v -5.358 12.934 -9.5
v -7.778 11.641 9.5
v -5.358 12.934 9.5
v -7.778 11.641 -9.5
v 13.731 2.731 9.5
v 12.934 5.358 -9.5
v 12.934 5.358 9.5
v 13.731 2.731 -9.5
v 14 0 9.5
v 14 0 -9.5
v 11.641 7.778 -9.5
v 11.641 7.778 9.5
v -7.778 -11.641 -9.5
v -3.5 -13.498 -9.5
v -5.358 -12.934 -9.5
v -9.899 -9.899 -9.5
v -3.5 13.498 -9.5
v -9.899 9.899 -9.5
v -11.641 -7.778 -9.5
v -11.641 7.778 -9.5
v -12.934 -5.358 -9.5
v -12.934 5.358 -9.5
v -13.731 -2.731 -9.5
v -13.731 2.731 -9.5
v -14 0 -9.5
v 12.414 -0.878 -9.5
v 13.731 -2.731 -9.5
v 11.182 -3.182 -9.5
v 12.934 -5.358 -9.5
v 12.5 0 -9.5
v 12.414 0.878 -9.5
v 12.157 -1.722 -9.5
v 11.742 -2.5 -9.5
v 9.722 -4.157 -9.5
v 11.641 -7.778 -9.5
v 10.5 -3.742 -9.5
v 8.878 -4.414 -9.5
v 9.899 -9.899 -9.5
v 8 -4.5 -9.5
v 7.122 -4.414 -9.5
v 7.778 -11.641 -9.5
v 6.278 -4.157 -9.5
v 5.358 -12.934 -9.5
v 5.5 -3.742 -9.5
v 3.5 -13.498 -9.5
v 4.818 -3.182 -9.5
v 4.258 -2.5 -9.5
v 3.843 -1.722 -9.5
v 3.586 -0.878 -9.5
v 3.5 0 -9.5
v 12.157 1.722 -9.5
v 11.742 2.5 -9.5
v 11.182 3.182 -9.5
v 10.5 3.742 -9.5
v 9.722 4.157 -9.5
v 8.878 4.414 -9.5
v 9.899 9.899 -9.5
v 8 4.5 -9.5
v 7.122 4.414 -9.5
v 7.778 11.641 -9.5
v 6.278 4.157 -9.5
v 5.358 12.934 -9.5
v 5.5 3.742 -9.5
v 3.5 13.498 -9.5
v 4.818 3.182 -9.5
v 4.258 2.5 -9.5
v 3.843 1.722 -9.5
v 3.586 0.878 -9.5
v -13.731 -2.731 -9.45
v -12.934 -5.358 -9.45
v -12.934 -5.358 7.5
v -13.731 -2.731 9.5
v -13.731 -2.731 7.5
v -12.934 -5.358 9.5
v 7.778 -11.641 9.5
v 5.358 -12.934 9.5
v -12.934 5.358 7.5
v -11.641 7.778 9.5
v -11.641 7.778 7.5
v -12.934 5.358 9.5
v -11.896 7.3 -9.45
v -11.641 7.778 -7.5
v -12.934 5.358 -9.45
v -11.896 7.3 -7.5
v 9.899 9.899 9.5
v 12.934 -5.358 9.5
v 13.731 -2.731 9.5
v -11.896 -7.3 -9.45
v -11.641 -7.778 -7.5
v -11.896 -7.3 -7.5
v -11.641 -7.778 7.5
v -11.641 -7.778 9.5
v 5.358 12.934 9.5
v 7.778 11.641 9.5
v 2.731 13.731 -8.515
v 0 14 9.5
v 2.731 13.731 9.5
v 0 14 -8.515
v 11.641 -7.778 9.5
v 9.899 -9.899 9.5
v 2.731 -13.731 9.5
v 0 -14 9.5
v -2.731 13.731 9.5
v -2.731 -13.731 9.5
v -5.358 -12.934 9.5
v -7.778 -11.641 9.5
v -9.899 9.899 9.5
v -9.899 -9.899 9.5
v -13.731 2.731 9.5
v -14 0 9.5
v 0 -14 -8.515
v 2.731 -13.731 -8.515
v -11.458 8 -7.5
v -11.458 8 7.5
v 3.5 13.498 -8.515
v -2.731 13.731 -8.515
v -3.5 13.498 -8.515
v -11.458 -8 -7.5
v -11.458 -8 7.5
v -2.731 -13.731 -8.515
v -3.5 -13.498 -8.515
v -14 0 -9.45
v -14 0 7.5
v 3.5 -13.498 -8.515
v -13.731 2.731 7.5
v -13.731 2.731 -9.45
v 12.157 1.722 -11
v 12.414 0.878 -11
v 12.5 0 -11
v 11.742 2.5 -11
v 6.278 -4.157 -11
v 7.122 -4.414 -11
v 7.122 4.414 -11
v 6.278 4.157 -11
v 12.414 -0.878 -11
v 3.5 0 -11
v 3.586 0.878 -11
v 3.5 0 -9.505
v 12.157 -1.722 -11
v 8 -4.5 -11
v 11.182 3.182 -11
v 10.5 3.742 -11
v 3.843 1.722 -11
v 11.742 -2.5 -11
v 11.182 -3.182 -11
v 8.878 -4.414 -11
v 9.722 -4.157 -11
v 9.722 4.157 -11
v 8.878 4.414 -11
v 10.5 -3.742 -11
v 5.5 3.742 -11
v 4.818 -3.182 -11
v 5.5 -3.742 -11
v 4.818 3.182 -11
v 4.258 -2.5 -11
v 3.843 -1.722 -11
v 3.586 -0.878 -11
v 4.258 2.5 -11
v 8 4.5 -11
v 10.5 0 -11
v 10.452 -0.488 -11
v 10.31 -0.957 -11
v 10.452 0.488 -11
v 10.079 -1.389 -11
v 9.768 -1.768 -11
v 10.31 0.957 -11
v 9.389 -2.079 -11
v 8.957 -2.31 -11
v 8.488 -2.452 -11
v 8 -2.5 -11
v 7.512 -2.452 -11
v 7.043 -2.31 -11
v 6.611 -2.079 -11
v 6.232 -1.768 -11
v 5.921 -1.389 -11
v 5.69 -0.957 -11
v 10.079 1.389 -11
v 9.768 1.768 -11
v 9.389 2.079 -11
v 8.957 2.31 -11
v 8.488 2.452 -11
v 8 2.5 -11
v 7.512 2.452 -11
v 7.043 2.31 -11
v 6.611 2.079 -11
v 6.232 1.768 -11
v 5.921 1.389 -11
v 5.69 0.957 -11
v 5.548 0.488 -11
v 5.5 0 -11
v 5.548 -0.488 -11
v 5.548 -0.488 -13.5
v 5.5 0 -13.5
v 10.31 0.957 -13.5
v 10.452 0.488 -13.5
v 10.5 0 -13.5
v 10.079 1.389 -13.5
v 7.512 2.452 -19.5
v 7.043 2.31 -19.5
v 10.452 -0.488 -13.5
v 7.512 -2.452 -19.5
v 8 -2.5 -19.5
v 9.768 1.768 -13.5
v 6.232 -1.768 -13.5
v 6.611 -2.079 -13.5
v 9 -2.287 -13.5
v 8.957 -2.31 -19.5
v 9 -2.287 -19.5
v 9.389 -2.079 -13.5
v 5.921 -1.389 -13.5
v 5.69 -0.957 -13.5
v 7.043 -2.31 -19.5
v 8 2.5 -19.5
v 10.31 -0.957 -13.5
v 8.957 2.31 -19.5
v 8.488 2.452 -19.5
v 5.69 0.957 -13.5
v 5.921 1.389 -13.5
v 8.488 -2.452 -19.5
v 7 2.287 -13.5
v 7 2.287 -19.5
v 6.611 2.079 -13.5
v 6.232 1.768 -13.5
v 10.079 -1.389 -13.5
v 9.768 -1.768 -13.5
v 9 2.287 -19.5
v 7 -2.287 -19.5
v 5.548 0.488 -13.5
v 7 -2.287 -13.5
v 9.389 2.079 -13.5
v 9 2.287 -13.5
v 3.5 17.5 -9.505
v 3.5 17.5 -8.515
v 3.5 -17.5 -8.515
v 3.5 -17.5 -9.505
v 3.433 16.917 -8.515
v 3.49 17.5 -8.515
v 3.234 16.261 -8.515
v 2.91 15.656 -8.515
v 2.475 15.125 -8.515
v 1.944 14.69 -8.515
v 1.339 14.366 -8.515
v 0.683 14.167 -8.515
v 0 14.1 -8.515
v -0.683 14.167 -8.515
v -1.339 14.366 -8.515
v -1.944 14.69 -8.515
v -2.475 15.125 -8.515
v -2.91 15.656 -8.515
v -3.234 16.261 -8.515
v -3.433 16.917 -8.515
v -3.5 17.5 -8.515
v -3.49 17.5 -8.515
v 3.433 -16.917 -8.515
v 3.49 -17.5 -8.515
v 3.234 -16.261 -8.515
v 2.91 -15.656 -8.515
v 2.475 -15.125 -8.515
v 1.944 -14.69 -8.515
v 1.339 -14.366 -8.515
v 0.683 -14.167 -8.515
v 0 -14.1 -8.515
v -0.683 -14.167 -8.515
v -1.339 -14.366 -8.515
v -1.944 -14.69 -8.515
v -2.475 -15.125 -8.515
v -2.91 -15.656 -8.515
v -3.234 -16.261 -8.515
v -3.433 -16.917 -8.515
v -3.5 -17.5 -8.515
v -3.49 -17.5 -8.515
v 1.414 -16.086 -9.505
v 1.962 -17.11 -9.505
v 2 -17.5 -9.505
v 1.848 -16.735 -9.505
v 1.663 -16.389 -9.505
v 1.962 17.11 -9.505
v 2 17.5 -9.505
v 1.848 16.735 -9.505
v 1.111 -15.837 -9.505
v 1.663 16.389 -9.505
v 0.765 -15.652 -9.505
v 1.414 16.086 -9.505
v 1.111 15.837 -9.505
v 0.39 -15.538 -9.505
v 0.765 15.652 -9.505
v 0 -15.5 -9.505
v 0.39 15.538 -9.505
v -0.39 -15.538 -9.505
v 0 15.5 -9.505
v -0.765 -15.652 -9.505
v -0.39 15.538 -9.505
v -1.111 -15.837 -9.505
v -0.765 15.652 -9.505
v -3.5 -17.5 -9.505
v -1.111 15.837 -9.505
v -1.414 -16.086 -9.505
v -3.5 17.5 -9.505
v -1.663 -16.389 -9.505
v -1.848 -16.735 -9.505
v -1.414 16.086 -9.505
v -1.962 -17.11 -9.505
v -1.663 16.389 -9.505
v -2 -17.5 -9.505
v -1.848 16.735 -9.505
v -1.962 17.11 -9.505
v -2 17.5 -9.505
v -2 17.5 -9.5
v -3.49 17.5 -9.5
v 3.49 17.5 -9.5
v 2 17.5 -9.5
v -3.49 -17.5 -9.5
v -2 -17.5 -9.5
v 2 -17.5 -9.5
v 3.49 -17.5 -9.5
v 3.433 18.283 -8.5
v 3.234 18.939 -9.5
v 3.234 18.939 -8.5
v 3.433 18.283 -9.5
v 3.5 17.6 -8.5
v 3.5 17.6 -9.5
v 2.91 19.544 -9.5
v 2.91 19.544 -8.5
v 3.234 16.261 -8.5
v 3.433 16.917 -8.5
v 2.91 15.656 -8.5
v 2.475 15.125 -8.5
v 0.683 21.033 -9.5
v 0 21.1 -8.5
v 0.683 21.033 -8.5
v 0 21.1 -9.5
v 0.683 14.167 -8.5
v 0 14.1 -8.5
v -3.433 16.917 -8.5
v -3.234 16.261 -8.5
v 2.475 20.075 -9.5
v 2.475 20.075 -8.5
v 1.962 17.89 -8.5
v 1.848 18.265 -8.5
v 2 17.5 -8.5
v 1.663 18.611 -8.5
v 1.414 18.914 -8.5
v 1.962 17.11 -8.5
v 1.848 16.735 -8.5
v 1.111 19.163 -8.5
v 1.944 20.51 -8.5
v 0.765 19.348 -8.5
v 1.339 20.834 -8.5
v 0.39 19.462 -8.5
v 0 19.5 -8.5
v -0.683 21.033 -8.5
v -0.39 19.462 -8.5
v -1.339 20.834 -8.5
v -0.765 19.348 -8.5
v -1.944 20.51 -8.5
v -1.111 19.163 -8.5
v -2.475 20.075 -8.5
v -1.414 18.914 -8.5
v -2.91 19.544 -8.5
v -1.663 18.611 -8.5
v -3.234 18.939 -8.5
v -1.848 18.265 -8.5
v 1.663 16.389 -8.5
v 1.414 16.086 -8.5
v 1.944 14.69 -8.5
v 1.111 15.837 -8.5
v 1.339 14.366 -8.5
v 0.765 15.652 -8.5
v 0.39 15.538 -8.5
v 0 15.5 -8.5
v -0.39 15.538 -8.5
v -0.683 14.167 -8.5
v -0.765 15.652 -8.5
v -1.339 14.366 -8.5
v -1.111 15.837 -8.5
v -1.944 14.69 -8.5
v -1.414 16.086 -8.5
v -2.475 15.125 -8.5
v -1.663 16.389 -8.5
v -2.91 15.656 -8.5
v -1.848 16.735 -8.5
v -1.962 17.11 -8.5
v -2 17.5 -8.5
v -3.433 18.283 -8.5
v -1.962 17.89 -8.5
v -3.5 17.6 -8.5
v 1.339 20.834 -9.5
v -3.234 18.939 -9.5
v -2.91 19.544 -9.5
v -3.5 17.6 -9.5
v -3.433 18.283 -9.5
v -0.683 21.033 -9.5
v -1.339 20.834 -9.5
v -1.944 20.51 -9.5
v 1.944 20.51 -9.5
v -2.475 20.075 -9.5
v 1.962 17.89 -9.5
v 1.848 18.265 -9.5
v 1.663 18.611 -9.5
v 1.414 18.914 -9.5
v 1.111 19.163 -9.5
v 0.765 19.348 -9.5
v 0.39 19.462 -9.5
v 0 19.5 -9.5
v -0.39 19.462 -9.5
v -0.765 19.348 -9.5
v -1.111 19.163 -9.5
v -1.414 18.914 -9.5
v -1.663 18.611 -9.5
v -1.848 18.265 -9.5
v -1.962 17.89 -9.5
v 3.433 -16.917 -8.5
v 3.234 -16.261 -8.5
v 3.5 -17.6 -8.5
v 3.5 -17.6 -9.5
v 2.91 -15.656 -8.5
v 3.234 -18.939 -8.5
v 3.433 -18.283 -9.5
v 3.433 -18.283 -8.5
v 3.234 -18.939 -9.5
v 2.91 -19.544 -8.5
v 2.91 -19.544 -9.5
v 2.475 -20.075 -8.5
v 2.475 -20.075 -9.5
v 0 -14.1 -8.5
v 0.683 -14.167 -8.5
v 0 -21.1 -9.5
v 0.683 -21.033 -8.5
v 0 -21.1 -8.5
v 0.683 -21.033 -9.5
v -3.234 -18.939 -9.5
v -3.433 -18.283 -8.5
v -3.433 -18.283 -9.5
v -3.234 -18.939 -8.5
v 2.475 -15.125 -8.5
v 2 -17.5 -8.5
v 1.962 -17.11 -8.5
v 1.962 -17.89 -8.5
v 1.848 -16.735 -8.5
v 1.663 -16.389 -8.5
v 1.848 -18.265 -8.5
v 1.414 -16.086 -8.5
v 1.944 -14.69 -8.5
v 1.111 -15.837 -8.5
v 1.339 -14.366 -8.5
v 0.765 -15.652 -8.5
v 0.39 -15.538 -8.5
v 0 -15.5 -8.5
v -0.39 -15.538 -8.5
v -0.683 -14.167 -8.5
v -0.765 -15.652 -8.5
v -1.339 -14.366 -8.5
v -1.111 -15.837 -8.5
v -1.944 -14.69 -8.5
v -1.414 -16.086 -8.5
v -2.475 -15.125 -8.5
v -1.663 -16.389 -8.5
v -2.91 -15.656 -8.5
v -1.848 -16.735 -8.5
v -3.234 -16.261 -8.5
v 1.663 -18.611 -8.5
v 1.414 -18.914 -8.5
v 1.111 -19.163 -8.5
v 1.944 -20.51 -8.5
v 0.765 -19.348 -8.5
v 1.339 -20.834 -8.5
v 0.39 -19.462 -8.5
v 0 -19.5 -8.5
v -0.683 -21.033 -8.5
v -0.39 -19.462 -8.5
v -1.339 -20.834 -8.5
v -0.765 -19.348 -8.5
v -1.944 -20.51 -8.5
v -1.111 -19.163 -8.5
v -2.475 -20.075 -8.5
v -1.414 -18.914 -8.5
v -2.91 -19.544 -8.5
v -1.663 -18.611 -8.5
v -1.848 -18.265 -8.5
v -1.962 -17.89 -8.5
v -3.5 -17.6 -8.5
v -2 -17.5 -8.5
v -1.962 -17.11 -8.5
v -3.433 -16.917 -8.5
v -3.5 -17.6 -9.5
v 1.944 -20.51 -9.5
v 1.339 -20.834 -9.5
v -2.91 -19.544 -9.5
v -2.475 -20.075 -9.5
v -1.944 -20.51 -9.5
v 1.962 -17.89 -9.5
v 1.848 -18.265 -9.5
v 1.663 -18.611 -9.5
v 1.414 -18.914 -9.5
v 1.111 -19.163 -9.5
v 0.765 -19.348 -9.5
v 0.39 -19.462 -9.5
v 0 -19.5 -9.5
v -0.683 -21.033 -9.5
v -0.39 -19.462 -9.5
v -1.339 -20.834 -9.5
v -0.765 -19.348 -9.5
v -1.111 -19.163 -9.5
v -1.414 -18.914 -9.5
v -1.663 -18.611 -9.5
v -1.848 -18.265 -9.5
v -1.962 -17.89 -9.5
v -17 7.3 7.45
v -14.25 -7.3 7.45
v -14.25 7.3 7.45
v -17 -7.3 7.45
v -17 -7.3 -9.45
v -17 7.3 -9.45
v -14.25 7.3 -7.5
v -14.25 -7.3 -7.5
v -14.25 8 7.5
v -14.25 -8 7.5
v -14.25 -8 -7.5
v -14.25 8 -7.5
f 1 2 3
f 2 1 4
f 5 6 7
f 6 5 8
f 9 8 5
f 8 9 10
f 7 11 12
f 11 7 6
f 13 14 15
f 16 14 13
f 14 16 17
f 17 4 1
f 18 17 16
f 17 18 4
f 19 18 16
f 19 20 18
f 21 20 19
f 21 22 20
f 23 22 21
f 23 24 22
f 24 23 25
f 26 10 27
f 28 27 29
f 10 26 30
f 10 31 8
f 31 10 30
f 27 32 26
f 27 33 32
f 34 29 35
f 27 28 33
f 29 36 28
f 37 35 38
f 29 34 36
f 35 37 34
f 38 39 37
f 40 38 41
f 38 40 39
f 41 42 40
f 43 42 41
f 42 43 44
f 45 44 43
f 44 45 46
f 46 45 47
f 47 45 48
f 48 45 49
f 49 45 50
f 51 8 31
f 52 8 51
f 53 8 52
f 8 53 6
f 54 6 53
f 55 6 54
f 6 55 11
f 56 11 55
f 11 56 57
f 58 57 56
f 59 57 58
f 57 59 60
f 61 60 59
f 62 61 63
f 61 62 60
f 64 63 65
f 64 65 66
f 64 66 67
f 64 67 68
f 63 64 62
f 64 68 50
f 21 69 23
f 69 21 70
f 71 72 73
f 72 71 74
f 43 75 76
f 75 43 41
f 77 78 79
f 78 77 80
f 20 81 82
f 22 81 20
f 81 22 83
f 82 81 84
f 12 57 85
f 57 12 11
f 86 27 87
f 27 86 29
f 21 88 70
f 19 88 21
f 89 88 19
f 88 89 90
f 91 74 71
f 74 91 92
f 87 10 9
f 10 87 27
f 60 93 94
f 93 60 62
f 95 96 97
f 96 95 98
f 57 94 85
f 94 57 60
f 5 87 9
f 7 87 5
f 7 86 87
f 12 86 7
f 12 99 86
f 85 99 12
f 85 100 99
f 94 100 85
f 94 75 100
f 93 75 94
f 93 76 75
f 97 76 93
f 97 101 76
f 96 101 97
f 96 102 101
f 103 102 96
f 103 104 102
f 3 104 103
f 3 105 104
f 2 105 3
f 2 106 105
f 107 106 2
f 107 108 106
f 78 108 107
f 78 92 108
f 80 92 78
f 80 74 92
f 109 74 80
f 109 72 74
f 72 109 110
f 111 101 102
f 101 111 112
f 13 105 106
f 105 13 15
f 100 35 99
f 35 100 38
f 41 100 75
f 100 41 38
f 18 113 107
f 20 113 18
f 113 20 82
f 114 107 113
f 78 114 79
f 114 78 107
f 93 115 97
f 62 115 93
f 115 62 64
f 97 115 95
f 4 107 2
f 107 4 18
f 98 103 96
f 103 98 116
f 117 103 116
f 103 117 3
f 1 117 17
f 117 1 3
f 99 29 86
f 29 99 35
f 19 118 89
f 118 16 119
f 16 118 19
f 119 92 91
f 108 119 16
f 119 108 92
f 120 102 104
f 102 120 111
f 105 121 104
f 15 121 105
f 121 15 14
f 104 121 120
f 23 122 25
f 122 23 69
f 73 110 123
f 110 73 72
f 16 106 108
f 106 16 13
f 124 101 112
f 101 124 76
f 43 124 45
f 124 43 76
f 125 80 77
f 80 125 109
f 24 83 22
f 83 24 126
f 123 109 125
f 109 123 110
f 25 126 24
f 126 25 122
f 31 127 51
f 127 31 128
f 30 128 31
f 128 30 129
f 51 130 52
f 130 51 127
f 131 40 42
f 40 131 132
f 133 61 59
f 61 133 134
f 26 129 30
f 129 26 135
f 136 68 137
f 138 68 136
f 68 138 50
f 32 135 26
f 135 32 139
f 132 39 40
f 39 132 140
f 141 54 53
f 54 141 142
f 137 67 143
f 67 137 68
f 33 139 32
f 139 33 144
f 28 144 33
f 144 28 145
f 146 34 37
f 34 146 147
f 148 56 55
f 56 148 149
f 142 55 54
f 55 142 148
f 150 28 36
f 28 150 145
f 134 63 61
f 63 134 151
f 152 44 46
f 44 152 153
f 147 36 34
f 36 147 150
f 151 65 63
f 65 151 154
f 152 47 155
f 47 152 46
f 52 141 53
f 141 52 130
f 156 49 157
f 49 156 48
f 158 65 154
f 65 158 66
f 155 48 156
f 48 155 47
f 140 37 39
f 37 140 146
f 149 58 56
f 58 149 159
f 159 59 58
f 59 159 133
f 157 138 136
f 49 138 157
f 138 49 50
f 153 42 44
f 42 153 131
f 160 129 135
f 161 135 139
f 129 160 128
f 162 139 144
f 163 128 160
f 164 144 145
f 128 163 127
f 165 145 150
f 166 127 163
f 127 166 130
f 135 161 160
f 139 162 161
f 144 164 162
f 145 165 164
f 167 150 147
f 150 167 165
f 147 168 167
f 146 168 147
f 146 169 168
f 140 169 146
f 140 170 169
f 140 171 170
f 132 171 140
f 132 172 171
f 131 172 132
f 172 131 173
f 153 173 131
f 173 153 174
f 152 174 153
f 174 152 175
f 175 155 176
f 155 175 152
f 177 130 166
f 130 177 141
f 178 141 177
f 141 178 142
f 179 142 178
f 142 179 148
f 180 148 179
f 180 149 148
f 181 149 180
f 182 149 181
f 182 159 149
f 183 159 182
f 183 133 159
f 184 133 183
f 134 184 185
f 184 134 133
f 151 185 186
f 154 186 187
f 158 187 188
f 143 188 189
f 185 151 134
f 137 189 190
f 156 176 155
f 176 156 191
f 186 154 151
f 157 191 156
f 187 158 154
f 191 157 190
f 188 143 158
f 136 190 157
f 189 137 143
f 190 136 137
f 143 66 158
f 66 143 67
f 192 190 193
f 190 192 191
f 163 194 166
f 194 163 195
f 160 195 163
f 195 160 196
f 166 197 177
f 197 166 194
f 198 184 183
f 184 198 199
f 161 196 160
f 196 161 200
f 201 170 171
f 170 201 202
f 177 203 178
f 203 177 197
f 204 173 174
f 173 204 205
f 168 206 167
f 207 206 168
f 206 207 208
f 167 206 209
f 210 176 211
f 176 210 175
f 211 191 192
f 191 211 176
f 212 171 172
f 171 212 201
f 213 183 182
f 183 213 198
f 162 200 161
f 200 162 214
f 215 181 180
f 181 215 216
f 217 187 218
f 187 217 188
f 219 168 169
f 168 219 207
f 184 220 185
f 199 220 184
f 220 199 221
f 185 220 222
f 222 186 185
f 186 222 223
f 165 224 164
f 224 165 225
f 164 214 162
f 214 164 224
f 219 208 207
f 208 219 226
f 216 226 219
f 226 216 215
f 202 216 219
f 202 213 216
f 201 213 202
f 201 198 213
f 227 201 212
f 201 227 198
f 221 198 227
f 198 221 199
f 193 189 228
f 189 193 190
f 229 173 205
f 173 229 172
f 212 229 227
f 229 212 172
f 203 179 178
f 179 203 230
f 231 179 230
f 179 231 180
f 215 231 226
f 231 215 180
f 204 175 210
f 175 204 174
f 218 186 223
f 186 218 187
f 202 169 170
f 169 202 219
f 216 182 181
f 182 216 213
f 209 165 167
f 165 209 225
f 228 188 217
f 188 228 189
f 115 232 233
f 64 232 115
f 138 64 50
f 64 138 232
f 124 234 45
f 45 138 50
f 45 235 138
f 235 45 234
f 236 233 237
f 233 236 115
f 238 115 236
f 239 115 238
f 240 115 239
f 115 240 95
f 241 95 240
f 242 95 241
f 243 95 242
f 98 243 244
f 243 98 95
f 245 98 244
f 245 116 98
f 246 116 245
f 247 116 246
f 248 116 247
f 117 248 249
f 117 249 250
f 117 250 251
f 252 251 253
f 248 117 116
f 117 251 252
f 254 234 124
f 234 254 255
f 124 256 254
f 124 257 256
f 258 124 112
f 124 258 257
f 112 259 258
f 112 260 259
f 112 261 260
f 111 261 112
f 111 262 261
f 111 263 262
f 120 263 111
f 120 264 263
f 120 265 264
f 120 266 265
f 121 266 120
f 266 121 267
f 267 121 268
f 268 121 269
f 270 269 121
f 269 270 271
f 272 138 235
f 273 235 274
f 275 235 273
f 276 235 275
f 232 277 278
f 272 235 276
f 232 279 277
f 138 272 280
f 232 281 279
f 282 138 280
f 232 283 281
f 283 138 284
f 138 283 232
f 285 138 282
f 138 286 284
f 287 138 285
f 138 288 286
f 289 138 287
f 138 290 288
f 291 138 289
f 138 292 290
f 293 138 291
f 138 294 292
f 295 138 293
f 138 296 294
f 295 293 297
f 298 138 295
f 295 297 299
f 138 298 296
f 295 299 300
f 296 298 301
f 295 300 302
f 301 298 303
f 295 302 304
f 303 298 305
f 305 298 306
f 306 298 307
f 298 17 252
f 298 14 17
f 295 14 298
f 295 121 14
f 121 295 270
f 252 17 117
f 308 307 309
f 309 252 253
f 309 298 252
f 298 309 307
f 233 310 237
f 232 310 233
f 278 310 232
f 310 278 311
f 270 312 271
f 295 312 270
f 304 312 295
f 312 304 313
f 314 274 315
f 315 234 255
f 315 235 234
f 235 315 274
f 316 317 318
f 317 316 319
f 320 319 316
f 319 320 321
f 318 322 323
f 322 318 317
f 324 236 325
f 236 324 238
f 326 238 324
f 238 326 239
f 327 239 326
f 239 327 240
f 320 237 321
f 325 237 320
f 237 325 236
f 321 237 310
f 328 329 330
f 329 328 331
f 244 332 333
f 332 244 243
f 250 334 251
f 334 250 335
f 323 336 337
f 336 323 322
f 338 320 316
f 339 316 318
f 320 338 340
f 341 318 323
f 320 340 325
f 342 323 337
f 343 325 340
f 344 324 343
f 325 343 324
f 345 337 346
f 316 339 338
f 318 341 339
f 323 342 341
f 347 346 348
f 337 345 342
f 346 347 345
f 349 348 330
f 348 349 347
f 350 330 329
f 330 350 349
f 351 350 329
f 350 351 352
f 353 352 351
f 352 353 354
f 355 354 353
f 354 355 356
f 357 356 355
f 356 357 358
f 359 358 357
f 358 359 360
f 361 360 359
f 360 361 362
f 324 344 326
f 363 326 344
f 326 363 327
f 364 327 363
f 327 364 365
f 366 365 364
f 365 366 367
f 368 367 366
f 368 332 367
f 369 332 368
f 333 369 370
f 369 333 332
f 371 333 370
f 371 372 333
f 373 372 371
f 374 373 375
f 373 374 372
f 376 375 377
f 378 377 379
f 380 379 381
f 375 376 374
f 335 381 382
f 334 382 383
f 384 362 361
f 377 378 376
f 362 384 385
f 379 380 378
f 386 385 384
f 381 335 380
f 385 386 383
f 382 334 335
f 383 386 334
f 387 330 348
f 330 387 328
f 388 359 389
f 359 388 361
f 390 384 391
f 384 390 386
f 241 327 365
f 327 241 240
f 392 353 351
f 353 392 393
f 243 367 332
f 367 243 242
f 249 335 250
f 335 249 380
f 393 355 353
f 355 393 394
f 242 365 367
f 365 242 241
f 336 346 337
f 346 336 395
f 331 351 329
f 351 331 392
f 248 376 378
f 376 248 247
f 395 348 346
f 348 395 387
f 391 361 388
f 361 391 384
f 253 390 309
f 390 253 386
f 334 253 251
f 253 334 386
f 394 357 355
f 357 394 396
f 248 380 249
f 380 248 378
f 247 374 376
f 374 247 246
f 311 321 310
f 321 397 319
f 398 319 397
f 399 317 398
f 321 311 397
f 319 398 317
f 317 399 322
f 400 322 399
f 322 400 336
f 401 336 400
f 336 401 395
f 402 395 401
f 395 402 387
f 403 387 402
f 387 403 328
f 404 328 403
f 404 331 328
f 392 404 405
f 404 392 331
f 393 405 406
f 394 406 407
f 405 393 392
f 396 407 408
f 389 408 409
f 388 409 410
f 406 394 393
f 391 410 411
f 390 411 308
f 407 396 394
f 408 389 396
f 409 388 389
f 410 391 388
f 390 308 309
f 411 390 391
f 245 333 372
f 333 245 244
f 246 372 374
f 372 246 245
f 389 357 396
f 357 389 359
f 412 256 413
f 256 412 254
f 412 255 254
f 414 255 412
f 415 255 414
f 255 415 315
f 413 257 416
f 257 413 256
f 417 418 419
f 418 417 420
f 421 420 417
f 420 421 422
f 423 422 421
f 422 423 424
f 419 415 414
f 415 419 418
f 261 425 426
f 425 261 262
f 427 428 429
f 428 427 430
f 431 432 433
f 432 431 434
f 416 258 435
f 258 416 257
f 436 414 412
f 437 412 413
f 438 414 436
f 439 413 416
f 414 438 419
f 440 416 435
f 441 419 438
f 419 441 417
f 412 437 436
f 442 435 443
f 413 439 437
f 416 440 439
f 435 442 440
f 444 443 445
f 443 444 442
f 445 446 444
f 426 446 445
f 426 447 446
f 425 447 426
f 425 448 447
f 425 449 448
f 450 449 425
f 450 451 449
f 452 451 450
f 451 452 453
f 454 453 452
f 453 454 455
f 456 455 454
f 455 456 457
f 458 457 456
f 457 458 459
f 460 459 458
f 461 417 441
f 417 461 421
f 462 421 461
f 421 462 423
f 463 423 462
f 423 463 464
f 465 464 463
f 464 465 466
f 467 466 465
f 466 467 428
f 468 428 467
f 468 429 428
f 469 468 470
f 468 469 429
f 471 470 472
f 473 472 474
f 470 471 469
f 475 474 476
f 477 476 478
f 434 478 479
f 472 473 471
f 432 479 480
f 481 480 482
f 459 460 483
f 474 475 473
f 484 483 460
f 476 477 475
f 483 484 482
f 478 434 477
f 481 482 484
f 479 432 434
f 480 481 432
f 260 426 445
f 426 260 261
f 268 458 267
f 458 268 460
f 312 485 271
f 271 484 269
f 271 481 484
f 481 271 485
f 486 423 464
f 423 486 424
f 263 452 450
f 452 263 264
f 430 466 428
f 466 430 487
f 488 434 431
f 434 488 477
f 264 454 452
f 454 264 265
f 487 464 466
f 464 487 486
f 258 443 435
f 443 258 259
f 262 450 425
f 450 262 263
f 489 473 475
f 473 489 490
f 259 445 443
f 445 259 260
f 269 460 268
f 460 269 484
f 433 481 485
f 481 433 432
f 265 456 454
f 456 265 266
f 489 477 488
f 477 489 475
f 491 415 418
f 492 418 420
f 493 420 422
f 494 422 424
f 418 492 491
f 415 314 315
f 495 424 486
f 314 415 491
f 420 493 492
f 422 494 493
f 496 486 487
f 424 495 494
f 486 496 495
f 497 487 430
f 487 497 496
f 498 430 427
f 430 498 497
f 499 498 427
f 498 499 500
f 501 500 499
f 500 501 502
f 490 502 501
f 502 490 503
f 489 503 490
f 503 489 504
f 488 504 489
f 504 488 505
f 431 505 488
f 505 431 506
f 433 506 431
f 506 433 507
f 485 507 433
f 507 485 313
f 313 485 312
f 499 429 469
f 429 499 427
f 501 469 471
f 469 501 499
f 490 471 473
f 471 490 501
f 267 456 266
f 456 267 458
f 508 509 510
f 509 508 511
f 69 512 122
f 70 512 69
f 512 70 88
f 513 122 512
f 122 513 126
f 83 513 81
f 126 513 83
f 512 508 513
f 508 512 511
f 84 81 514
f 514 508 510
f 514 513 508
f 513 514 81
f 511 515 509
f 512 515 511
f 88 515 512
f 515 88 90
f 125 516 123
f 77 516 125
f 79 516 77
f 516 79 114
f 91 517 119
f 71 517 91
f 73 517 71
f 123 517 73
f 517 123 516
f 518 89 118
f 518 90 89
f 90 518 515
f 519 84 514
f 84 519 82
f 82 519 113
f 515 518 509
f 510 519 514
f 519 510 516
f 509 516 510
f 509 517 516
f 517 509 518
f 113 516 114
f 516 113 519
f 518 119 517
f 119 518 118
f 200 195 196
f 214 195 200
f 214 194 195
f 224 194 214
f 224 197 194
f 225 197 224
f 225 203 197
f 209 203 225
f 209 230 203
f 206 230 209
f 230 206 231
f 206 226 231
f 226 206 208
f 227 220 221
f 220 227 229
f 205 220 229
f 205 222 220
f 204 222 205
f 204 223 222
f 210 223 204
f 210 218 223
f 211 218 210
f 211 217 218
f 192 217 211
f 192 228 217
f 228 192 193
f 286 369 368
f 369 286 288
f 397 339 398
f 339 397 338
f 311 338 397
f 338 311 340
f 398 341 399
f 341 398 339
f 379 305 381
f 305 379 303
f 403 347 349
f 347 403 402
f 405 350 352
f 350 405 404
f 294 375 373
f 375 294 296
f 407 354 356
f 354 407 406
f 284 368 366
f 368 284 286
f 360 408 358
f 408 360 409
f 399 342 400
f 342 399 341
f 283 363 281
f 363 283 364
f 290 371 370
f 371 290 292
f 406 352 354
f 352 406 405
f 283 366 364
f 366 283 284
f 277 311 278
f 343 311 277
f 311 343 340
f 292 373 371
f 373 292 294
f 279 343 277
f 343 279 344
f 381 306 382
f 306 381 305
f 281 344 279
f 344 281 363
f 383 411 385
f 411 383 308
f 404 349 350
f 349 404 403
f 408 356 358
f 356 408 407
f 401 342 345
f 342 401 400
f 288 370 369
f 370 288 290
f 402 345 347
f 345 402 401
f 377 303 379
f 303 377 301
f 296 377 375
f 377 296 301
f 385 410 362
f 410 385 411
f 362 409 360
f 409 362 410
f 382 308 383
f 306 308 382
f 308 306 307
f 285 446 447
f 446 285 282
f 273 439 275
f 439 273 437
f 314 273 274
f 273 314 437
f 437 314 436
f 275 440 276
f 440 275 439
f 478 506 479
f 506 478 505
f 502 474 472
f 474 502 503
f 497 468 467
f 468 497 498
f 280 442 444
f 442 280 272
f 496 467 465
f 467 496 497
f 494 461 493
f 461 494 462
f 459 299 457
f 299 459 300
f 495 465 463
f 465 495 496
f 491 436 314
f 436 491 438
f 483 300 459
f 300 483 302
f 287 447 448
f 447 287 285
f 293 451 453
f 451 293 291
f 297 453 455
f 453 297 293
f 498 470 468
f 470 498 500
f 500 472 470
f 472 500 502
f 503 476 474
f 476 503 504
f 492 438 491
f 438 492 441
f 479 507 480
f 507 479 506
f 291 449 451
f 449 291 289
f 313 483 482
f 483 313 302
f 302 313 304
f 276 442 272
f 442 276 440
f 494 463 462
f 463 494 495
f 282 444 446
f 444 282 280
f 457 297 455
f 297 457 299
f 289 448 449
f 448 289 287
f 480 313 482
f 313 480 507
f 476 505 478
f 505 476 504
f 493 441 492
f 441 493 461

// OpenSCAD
// http://www.thingiverse.com/thing:204734/
//Stepper Motor 28BYJ-48 by RGriffoGoes is licensed under the Creative Commons - Attribution - Share Alike license.

module StepMotor28BYJ()
{

	difference(){
	
		union(){
				color("gray") cylinder(h = 19, r = 14, center = true, $fn = 32);
				color("gray") translate([8,0,-1.5])	cylinder(h = 19, r = 4.5, center = true, $fn = 32);
				color("gold") translate([8,0,-10])	cylinder(h = 19, r = 2.5, center = true, $fn = 32);


				color("Silver") translate([0,0,-9.01]) cube([7,35,0.99], center = true);				
				color("Silver") translate([0,17.6,-9])	cylinder(h = 1, r = 3.5, center = true, $fn = 32);

				color("Silver") translate([0,-17.6,-9])	cylinder(h = 1, r = 3.5, center = true, $fn = 32);


				color("blue") translate([-3,0,-1]) cube([28,14.6,16.9], center = true);
				color("blue") translate([-2,0,0])  cube([24.5,16,15], center = true);
			}

				// handle
				color("red") translate([11,0,-16.55]) cube([4,5,6.1], center = true);
				color("red") translate([5,0,-16.55]) cube([4,5,6.1], center = true);

				// screw holes
				color("red") translate([0,17.5,-9])	cylinder(h = 2, r = 2, center = true, $fn = 32);
				color("red") translate([0,-17.5,-9])	cylinder(h = 2, r = 2, center = true, $fn = 32);
		}
	}
StepMotor28BYJ();
